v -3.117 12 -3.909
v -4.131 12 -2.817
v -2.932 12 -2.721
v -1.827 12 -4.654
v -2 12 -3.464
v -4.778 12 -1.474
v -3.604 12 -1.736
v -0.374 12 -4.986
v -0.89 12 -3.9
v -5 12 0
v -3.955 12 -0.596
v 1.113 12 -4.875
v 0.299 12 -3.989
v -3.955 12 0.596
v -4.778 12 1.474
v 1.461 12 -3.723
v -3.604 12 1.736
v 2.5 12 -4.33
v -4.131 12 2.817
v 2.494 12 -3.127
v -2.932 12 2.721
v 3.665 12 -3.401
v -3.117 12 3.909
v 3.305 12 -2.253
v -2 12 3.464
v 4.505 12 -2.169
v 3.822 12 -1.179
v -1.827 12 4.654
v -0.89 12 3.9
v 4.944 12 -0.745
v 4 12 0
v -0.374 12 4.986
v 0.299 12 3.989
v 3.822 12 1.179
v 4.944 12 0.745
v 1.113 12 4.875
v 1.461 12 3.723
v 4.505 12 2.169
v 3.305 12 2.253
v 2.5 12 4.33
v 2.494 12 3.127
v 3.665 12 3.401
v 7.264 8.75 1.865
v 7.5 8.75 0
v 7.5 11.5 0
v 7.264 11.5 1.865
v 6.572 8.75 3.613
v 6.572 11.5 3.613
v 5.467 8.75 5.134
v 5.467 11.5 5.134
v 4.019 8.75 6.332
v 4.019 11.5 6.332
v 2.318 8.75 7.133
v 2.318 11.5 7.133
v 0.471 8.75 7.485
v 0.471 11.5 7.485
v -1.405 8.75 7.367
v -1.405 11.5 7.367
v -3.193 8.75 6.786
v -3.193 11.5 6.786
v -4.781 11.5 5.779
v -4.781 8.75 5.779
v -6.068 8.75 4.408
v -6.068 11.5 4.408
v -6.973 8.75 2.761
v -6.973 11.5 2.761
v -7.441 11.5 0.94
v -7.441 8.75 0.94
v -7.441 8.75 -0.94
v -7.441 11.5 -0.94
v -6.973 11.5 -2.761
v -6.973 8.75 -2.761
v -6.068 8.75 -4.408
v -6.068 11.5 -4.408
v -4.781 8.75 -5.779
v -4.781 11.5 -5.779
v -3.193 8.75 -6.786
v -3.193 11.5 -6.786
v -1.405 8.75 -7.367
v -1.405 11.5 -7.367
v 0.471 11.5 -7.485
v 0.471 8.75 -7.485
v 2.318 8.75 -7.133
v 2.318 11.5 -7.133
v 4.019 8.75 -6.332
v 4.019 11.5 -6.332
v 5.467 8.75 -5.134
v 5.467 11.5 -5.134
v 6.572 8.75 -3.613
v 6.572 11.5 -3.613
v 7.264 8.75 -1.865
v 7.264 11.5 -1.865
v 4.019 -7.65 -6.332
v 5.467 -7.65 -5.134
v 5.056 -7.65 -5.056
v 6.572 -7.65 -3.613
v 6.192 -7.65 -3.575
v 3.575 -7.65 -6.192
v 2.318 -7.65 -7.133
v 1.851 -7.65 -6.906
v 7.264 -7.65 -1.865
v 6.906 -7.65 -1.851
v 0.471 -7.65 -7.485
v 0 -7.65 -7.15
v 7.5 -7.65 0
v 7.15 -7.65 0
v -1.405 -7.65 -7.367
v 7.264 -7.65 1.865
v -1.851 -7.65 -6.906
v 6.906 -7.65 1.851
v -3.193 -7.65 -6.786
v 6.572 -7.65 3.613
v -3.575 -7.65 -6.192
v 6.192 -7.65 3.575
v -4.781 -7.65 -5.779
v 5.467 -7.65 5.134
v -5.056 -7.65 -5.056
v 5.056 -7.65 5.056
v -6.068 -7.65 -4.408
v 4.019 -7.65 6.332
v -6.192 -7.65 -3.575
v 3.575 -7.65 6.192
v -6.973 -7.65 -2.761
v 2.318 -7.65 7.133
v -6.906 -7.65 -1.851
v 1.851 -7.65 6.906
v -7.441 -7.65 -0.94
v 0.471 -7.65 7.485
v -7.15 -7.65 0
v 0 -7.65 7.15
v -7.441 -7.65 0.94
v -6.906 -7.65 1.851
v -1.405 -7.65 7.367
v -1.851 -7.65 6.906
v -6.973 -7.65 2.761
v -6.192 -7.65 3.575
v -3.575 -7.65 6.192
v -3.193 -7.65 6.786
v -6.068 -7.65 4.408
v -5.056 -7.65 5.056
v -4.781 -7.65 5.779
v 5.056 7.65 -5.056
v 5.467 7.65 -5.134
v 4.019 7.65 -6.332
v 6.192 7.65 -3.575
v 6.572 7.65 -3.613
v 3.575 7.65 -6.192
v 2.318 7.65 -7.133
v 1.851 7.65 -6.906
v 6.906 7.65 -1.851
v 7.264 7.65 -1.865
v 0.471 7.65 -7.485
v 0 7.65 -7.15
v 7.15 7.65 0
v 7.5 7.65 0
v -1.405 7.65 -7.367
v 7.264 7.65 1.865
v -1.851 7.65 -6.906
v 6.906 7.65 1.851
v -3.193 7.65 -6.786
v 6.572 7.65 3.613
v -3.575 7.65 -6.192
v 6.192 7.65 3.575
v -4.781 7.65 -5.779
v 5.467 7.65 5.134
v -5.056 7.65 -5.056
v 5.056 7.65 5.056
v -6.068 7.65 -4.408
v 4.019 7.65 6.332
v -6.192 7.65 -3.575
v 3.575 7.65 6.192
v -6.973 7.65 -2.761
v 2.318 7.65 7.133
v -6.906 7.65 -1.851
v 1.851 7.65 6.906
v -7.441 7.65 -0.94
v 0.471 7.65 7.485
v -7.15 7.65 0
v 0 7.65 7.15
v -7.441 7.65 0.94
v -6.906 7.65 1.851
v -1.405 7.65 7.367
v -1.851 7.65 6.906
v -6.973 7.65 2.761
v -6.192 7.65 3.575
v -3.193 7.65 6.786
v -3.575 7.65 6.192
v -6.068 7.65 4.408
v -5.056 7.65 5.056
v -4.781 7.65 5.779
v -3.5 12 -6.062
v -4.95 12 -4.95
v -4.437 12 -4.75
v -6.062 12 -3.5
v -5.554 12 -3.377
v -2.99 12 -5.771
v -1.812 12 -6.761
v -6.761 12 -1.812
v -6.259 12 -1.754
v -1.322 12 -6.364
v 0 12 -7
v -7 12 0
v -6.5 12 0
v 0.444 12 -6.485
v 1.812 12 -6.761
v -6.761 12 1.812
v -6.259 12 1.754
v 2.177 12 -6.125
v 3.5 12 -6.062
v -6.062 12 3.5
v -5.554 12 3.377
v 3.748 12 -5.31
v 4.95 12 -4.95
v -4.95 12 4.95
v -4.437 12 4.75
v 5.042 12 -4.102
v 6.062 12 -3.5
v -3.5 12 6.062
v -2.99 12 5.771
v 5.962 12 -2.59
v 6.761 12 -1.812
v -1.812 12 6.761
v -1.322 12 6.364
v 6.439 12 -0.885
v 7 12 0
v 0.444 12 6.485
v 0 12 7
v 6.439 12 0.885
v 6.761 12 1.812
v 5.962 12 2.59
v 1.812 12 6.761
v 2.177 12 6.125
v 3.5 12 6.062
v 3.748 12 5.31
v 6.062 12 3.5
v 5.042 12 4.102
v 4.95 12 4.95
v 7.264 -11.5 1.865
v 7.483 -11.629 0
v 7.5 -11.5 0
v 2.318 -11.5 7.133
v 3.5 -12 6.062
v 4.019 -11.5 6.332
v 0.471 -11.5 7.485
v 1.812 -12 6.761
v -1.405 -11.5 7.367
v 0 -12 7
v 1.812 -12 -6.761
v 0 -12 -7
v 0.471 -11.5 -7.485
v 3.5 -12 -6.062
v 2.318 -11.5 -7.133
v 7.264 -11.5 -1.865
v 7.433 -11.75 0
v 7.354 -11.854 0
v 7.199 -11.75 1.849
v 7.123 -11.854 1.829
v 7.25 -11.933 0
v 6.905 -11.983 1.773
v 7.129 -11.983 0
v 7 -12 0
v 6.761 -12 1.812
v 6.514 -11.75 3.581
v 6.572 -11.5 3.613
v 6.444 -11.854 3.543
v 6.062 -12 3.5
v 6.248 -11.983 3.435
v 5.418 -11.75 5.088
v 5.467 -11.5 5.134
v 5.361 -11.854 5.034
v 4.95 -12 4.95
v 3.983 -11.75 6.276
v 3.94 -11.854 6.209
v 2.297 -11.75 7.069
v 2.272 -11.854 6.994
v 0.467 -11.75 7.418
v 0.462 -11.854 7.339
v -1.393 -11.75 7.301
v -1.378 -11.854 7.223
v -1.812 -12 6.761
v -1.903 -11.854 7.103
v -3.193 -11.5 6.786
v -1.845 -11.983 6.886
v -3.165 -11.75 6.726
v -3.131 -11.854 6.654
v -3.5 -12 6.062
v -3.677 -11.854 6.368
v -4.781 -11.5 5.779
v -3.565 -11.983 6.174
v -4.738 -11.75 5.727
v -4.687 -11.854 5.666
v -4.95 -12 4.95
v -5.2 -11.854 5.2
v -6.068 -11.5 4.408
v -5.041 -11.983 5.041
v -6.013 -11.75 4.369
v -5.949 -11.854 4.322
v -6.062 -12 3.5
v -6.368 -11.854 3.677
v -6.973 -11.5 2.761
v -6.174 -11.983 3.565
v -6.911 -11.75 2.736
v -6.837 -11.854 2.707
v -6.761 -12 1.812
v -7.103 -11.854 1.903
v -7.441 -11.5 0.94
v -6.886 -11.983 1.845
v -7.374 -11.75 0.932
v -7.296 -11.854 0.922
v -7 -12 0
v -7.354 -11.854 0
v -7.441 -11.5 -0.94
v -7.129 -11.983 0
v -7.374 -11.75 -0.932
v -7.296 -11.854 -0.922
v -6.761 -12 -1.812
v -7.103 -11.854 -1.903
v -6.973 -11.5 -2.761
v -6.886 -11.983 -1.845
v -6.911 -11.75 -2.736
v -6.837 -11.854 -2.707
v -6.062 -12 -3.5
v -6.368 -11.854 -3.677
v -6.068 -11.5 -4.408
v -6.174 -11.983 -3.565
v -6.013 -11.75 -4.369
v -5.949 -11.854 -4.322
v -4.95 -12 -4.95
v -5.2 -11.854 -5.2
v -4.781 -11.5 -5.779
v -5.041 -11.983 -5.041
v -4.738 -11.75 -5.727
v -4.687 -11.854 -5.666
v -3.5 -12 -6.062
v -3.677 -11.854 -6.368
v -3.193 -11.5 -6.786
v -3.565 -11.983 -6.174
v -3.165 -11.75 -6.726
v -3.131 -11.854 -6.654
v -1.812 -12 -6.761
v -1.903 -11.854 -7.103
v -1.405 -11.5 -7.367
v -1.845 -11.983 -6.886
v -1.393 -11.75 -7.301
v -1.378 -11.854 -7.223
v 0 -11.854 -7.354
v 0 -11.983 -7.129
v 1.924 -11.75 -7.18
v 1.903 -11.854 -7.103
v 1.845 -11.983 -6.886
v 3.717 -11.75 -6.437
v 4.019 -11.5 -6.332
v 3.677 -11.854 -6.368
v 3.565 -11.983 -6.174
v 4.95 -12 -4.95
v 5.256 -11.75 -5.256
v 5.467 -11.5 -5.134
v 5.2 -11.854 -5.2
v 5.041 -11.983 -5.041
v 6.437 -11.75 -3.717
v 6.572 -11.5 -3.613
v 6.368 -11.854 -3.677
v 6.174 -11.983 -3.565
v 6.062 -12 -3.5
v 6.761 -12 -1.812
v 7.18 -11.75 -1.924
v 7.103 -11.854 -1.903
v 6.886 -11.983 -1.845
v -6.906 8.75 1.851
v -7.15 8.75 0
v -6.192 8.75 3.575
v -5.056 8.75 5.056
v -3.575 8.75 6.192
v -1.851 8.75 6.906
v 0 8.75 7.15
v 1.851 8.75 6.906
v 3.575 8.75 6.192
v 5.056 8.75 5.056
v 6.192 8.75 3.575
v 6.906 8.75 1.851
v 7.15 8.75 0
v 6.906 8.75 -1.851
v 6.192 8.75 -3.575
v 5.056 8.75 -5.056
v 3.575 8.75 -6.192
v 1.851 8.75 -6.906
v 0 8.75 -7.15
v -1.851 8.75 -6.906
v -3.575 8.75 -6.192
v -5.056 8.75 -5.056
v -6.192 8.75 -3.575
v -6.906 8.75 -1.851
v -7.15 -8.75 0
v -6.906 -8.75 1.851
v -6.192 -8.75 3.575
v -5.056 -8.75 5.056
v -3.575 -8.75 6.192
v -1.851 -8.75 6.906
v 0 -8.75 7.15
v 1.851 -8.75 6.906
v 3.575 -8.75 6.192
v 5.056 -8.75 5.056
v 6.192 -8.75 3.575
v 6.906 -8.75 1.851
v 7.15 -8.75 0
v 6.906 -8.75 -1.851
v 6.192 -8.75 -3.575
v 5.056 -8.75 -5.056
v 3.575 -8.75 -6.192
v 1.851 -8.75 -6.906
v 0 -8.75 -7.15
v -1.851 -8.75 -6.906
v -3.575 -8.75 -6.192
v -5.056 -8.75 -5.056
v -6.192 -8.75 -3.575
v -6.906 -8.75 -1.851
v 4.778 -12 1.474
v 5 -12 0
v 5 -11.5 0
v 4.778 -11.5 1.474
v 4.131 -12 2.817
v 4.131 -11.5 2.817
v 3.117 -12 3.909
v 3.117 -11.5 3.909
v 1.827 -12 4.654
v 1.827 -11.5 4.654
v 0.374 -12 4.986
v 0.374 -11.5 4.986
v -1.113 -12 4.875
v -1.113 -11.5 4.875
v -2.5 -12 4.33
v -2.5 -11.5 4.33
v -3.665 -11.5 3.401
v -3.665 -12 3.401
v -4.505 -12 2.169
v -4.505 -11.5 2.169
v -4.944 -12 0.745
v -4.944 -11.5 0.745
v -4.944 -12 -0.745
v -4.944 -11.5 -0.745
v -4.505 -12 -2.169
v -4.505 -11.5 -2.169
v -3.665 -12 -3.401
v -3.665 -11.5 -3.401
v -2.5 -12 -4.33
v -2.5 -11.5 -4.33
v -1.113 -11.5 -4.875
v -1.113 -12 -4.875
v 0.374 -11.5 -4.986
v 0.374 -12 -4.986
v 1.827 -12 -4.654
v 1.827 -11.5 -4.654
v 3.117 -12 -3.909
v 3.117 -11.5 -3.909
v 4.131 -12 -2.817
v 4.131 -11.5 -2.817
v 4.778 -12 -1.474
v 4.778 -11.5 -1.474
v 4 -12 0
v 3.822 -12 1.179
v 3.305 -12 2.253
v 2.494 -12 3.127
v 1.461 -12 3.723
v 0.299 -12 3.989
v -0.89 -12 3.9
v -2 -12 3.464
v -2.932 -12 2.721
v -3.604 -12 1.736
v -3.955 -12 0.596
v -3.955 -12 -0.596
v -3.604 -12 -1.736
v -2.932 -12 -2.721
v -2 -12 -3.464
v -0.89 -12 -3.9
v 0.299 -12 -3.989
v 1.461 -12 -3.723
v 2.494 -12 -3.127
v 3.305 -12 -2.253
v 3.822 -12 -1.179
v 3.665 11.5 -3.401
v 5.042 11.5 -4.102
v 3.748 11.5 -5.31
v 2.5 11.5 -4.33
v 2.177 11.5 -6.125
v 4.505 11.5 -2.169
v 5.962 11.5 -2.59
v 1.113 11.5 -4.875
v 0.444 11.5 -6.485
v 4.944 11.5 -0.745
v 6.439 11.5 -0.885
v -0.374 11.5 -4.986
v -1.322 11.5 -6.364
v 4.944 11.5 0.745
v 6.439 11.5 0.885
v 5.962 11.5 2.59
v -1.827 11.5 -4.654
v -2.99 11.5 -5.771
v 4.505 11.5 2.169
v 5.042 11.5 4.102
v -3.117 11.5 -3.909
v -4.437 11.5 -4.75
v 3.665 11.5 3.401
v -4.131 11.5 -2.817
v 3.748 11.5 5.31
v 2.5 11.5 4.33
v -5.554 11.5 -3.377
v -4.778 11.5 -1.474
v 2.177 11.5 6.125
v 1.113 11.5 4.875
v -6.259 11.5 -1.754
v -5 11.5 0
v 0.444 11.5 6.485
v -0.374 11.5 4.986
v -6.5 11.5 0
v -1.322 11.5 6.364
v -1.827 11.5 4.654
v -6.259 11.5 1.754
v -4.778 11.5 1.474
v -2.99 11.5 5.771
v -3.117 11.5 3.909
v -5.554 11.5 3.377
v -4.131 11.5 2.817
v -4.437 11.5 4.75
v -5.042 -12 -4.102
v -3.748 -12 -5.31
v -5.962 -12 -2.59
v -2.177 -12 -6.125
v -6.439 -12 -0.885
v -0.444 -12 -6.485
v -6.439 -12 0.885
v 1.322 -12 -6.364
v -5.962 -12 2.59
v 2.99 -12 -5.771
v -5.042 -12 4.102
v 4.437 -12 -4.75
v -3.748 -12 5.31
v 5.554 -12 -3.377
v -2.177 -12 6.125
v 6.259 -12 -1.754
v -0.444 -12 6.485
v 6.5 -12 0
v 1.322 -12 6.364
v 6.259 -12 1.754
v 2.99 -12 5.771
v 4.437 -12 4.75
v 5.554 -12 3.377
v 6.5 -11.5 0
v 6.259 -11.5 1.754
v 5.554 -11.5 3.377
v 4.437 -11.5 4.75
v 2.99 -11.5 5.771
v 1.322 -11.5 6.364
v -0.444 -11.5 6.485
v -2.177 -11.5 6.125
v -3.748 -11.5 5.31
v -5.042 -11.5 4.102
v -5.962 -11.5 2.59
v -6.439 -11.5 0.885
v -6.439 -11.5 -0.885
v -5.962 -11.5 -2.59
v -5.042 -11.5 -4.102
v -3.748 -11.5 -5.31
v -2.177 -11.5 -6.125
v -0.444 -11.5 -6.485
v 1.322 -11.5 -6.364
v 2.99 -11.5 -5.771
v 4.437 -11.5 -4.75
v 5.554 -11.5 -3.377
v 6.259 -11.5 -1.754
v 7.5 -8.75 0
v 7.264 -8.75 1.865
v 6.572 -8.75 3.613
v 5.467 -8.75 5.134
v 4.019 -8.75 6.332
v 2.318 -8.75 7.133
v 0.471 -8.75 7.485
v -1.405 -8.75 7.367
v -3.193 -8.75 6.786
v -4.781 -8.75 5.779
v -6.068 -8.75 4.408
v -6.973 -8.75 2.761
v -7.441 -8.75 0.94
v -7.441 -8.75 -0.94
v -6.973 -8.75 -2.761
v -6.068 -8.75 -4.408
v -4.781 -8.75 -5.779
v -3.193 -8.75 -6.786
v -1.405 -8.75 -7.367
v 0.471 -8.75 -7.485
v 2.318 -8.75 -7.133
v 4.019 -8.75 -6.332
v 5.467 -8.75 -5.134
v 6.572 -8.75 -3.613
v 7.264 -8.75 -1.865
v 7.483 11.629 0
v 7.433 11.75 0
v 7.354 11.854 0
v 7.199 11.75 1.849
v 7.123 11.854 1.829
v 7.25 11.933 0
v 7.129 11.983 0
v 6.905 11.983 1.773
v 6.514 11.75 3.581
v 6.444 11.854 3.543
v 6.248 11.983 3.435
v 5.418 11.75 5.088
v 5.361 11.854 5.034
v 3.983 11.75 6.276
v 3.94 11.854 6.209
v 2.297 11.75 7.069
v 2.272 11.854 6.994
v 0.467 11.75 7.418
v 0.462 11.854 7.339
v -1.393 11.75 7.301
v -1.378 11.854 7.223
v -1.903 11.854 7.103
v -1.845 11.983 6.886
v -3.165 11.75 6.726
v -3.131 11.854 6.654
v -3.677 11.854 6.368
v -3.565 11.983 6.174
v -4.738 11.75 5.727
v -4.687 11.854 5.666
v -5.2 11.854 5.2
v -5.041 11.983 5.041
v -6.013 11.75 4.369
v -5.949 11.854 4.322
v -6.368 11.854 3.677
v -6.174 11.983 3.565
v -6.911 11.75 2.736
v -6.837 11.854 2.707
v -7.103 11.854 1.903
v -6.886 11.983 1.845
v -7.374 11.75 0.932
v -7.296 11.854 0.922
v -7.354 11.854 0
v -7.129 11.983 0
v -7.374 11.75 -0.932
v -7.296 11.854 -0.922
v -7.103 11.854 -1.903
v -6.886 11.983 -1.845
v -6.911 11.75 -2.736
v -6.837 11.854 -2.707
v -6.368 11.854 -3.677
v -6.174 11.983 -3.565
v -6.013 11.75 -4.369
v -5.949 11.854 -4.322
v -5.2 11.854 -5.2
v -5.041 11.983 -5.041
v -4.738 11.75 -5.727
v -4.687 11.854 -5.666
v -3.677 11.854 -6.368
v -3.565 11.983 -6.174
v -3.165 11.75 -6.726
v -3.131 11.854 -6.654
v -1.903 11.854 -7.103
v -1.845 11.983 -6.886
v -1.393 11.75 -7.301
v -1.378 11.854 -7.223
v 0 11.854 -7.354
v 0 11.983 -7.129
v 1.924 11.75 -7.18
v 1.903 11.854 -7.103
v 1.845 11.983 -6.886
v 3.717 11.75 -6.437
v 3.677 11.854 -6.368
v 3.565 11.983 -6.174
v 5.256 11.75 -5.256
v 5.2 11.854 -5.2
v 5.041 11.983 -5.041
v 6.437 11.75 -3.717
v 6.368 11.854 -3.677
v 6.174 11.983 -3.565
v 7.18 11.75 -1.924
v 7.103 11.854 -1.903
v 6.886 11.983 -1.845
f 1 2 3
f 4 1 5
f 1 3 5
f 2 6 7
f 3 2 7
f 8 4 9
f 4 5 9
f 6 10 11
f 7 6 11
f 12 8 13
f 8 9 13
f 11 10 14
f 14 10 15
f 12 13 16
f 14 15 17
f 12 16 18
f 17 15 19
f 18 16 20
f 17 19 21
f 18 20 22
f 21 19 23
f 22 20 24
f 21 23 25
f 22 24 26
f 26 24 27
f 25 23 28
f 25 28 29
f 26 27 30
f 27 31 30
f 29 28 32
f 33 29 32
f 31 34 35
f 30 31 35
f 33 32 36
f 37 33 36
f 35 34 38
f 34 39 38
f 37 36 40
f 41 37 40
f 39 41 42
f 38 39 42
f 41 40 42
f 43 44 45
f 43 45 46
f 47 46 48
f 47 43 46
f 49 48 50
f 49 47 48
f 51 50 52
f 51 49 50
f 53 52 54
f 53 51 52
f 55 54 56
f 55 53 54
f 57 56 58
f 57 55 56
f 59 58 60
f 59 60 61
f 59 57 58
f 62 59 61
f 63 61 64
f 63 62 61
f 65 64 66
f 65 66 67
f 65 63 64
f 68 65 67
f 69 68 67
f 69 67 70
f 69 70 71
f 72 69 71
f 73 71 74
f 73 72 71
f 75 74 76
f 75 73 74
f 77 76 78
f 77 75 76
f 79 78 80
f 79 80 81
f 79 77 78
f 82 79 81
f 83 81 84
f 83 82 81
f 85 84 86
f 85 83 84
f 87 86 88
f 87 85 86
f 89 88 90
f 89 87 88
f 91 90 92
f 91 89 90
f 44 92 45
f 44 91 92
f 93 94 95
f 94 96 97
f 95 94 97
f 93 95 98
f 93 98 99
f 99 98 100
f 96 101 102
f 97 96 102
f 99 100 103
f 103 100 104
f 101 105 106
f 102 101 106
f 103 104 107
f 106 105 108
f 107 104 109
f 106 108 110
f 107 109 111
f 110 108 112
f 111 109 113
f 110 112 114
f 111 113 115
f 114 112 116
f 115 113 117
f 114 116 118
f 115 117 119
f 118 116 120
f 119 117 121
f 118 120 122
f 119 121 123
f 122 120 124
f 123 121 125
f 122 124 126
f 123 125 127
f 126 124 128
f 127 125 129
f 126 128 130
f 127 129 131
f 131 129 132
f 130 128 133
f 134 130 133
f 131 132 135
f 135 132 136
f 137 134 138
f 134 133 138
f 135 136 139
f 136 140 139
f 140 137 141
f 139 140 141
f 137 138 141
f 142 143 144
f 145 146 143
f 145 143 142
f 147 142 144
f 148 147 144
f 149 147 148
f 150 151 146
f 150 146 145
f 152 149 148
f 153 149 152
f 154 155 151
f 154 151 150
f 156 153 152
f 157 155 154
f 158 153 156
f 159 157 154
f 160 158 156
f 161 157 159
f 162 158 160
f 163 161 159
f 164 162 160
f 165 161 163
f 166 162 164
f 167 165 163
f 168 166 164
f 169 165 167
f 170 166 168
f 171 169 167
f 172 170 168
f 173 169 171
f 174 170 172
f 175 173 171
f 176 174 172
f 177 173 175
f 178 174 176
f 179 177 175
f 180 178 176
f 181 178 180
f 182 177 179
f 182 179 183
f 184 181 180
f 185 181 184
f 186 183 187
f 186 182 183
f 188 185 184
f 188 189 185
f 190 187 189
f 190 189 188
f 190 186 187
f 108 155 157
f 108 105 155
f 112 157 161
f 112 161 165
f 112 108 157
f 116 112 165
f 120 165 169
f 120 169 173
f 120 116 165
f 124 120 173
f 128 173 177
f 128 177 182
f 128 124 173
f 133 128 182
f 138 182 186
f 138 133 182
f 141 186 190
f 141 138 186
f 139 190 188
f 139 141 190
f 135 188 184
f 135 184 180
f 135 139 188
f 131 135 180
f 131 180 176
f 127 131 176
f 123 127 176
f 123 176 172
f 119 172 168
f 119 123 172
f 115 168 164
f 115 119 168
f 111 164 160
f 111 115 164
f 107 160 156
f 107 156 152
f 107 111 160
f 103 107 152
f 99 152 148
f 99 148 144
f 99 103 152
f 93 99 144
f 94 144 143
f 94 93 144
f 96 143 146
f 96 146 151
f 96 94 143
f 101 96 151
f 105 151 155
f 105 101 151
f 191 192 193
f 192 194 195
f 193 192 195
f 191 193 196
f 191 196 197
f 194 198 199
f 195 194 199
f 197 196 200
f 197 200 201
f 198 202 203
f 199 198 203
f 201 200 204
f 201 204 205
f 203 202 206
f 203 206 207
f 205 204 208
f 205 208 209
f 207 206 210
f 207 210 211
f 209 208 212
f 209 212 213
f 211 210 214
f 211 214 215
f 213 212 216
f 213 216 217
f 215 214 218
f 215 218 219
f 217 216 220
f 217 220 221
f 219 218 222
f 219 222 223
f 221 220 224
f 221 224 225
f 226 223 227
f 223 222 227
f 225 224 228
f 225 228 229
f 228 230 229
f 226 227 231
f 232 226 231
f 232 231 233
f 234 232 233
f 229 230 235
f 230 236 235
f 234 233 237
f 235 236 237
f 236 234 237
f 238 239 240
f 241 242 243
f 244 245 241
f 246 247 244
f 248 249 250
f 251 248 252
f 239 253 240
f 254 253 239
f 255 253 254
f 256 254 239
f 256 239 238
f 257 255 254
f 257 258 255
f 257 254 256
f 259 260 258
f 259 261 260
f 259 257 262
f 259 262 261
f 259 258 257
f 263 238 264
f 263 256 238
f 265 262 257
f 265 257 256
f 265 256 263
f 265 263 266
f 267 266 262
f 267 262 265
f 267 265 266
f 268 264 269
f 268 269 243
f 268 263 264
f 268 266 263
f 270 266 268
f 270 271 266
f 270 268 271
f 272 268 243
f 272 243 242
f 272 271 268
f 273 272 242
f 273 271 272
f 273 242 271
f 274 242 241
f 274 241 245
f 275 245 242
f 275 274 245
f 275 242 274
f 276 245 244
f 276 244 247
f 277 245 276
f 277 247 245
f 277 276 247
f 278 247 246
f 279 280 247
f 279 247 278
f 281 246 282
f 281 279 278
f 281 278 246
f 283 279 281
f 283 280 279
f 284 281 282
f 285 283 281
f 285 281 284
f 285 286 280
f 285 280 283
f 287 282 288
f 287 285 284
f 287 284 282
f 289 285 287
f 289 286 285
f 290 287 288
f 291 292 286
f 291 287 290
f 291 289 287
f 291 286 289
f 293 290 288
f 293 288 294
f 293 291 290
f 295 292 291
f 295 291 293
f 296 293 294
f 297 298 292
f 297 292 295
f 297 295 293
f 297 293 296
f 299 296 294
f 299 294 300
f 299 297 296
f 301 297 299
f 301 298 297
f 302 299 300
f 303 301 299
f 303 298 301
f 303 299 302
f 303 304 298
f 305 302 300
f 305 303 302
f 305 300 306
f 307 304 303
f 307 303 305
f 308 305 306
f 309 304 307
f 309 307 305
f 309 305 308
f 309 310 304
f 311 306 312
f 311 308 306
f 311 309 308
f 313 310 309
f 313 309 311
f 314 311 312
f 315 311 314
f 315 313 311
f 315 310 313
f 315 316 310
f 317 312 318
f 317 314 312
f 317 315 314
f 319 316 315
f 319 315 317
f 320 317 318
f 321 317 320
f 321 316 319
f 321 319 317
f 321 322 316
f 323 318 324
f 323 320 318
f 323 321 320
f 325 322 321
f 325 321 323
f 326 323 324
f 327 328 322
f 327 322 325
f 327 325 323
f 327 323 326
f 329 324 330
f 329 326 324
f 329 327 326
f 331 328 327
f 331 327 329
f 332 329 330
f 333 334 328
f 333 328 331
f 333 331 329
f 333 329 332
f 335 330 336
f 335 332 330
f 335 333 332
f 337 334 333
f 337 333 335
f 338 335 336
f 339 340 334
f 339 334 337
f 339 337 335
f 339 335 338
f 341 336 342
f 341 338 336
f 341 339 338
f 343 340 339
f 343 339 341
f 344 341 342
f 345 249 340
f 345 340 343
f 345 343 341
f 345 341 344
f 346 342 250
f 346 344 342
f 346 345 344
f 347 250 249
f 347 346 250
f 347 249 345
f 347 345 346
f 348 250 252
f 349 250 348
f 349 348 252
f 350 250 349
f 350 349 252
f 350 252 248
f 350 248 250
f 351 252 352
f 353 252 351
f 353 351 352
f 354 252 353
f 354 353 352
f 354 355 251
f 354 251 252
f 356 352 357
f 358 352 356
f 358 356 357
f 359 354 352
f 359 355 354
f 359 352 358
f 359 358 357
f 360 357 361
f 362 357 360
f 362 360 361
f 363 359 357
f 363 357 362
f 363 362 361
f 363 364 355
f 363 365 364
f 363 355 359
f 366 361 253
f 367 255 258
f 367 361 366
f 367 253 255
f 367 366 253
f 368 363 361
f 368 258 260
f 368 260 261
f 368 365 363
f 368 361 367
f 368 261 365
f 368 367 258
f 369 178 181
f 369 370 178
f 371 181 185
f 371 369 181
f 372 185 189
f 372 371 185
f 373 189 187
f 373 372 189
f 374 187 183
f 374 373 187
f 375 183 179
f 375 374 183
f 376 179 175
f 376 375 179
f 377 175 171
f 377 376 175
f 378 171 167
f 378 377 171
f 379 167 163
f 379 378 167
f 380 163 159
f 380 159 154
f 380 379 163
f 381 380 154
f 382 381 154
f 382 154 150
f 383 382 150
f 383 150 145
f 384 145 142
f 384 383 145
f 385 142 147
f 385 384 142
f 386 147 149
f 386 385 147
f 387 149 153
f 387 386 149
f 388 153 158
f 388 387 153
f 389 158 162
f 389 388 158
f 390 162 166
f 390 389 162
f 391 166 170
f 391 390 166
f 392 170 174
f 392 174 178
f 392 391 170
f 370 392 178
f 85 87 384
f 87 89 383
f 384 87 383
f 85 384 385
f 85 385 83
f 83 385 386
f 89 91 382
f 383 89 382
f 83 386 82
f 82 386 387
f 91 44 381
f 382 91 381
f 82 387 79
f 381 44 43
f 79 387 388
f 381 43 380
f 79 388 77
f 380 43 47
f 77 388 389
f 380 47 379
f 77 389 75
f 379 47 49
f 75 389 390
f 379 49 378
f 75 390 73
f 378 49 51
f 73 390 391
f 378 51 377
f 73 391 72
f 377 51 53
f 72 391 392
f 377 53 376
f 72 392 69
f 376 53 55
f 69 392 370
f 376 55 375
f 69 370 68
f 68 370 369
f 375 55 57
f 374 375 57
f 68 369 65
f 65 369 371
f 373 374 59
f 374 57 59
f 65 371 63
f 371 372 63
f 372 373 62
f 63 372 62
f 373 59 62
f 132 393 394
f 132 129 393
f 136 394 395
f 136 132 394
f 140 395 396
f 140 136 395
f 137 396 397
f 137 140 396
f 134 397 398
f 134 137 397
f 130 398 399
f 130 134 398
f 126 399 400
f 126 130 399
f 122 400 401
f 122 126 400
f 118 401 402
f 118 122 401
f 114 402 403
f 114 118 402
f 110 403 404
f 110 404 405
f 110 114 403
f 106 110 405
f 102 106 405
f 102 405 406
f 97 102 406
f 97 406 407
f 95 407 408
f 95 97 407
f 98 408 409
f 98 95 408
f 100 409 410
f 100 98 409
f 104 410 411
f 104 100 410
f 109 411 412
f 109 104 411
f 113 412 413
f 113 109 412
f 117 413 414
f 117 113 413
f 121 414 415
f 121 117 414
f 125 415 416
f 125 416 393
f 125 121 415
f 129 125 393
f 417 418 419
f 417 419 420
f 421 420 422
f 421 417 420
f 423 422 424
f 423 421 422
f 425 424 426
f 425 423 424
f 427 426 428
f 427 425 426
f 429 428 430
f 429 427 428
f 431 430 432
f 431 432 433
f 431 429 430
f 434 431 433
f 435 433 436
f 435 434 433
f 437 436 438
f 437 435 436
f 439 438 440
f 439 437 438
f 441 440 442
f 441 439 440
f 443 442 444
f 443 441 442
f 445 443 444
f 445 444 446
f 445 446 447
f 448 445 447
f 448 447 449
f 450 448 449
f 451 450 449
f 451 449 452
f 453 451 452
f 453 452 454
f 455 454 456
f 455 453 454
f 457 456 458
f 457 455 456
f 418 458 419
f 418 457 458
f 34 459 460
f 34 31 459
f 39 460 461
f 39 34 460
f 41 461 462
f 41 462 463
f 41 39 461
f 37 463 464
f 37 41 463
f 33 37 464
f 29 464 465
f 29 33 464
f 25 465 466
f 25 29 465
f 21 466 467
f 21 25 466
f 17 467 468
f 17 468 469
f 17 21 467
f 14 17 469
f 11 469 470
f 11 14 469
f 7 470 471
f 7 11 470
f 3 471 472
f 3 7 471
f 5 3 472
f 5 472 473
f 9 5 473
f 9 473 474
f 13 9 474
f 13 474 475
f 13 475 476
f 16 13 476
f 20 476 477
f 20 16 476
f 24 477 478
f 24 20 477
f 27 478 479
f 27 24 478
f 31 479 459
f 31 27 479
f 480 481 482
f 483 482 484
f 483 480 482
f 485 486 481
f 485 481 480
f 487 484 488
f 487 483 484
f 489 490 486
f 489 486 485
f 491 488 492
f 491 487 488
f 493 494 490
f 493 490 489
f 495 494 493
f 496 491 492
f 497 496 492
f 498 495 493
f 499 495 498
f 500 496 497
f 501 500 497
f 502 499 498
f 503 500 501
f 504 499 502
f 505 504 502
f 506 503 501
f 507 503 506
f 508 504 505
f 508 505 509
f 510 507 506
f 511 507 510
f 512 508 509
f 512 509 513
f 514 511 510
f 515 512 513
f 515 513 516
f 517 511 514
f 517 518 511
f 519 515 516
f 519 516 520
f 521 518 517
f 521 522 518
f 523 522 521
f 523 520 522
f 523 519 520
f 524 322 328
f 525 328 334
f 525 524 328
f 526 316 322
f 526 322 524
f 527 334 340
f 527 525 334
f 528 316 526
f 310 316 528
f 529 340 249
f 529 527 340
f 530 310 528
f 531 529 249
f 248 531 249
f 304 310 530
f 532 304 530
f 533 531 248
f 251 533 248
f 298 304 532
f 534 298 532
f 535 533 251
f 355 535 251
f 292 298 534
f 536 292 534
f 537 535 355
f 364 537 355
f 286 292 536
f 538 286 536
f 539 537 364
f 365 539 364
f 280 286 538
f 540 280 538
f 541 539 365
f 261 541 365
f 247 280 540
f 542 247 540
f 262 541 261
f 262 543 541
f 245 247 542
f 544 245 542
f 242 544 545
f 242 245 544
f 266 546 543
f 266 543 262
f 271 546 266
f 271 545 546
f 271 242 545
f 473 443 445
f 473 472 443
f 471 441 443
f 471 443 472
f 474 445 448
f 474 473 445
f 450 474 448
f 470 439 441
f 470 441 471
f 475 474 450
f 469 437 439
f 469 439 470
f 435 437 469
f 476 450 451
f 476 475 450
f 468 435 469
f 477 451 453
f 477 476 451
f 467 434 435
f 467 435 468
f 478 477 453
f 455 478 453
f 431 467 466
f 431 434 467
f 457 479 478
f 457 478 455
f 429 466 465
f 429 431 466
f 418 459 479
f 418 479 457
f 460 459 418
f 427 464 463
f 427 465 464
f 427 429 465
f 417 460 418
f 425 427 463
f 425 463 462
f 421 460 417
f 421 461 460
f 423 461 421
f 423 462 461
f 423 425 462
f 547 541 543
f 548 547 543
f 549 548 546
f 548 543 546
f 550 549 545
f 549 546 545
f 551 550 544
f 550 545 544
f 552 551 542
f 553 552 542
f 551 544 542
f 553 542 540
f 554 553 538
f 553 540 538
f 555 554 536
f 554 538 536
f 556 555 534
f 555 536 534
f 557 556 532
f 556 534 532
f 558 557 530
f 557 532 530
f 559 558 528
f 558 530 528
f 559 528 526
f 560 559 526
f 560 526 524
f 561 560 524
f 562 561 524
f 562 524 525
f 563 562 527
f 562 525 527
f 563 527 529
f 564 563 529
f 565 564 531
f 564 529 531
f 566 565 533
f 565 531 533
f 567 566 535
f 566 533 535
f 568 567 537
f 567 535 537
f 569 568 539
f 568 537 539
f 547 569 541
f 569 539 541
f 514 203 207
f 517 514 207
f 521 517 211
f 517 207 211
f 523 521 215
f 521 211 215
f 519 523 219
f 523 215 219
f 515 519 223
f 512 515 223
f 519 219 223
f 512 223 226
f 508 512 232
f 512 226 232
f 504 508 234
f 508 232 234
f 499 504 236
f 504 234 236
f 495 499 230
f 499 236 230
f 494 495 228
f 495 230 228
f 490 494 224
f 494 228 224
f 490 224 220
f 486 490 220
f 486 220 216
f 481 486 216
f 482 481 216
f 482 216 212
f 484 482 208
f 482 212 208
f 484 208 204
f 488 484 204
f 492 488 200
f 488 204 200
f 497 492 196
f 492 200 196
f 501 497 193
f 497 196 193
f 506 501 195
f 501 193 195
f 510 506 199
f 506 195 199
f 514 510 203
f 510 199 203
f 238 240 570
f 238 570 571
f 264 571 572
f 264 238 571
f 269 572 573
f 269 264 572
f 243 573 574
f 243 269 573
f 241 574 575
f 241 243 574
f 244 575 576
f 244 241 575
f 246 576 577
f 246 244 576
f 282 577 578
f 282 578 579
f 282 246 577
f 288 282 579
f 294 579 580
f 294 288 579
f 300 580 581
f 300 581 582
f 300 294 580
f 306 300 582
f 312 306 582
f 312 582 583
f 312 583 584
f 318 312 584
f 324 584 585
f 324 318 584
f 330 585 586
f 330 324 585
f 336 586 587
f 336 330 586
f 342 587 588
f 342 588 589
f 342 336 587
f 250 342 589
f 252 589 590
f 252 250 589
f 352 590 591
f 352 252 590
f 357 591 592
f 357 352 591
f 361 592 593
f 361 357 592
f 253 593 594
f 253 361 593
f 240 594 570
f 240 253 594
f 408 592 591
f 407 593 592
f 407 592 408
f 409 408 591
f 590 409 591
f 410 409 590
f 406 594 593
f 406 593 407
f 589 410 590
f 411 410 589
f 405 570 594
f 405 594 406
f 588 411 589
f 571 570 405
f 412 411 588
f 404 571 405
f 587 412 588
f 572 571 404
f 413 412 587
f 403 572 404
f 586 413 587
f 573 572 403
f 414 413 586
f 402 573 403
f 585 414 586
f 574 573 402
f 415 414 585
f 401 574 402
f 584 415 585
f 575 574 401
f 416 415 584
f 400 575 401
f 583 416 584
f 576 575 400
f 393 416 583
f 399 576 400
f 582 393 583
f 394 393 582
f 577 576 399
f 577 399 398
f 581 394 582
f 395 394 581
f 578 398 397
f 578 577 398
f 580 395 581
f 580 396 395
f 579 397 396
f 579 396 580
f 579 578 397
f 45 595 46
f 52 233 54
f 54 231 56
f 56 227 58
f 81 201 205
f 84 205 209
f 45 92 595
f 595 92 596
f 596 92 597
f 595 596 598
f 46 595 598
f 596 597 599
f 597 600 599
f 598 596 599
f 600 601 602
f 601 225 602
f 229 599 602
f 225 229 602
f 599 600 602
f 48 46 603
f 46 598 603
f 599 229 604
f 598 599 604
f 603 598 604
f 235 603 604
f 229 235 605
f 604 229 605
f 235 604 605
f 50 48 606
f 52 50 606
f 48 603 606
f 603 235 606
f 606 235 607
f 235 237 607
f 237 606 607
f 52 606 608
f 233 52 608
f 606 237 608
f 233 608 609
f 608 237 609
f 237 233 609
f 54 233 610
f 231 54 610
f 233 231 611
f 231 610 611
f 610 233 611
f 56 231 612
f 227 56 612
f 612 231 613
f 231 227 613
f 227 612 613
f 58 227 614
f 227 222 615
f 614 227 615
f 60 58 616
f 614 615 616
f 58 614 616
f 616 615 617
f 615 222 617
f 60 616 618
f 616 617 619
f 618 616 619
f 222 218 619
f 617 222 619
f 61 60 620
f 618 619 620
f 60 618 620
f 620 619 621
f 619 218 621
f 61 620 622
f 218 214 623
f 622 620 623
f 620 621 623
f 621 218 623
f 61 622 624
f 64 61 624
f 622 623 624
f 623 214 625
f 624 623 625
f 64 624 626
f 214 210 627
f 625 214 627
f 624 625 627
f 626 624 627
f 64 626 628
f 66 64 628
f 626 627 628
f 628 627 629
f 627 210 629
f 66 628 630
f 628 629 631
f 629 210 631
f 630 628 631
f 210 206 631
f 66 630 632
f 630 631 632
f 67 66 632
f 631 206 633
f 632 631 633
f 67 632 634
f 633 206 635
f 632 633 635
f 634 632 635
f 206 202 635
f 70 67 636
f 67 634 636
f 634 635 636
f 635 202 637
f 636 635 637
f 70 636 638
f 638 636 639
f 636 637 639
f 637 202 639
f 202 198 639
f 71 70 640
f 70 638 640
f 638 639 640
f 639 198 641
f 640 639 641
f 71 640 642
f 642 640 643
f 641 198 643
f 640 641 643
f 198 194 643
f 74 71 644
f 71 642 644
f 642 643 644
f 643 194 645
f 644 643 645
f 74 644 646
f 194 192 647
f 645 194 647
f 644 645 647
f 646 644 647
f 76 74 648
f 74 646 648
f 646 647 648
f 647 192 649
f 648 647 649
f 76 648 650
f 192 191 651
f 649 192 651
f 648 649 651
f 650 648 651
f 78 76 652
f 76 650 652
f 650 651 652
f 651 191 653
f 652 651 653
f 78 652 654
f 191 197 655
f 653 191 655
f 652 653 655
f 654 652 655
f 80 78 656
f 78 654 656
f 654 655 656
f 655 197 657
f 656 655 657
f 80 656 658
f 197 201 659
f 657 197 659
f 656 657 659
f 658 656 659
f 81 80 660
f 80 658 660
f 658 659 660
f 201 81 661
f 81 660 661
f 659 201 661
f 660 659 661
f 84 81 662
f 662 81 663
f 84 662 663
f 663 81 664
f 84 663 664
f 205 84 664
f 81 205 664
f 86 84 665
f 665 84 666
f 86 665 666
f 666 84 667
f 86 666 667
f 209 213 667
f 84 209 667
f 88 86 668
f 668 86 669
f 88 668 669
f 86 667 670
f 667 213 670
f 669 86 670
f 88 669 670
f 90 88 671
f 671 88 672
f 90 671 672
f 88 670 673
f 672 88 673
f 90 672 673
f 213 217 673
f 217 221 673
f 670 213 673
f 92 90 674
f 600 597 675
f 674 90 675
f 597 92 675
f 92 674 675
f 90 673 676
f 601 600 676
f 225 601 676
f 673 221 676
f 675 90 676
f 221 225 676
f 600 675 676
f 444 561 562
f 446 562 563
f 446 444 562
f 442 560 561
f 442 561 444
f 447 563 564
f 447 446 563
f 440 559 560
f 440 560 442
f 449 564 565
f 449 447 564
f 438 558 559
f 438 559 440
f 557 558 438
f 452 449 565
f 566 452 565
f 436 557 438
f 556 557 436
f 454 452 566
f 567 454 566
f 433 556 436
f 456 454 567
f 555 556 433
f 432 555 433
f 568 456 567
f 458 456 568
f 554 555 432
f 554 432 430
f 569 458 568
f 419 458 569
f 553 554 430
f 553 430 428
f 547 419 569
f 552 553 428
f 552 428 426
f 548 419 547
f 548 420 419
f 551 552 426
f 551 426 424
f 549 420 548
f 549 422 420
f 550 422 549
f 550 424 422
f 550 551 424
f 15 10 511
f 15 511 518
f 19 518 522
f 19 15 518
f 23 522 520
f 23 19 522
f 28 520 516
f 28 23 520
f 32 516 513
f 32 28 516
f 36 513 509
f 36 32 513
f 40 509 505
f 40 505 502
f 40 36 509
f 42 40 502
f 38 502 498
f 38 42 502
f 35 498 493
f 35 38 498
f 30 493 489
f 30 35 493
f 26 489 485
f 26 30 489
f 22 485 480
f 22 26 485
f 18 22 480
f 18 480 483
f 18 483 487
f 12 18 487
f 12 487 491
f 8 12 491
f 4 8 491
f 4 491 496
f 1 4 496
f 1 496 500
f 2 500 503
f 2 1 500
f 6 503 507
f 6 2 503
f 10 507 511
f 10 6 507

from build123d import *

# Parameters (mm, degrees)
F0_R     = 7.5
F0_R_2   = 4
F1_DEPTH = 12
F2_W     = 1
F2_H     = 1.1
F4_R     = 6.5
F4_R_2   = 5
F5_DEPTH = 0.5
F6_R     = 6.5
F6_R_2   = 5
F7_DEPTH = 0.5
F8_R     = 0.5


with BuildPart() as f1:
    # F0 (on Front) → F1 (new body, symmetric)
    with BuildSketch(Plane.XZ):
        Circle(F0_R)
        Circle(F0_R_2, mode=Mode.SUBTRACT)
    extrude(amount=F1_DEPTH, both=True)

    # F2 (on Top) → F3 (revolve, cut)
    with BuildSketch(Plane.XY):
        with Locations((-7.65, 8.2)):
            Rectangle(F2_W, F2_H)
        with Locations((-7.65, -8.2)):
            Rectangle(F2_W, F2_H)
    revolve(axis=Axis((0, 10.336502, 0), (0, 1, 0)), mode=Mode.SUBTRACT)

    # F4 (on face) → F5 (cut)
    with BuildSketch(Plane.XZ.offset(12)):
        Circle(F4_R)
        Circle(F4_R_2, mode=Mode.SUBTRACT)
    extrude(amount=-F5_DEPTH, mode=Mode.SUBTRACT)

    # F6 (on face) → F7 (cut)
    with BuildSketch(Plane(origin=(0, 12, 0), x_dir=(-1, 0, 0), z_dir=(0, 1, 0))):
        Circle(F6_R)
        Circle(F6_R_2, mode=Mode.SUBTRACT)
    extrude(amount=-F7_DEPTH, mode=Mode.SUBTRACT)

    # F8
    f8_edges = [f1.edges().sort_by_distance(p)[0] for p in [
        (-7.5, 12, 0),
        (-7.5, -12, 0),
    ]]
    fillet(f8_edges, radius=F8_R)


solid = f1.part
